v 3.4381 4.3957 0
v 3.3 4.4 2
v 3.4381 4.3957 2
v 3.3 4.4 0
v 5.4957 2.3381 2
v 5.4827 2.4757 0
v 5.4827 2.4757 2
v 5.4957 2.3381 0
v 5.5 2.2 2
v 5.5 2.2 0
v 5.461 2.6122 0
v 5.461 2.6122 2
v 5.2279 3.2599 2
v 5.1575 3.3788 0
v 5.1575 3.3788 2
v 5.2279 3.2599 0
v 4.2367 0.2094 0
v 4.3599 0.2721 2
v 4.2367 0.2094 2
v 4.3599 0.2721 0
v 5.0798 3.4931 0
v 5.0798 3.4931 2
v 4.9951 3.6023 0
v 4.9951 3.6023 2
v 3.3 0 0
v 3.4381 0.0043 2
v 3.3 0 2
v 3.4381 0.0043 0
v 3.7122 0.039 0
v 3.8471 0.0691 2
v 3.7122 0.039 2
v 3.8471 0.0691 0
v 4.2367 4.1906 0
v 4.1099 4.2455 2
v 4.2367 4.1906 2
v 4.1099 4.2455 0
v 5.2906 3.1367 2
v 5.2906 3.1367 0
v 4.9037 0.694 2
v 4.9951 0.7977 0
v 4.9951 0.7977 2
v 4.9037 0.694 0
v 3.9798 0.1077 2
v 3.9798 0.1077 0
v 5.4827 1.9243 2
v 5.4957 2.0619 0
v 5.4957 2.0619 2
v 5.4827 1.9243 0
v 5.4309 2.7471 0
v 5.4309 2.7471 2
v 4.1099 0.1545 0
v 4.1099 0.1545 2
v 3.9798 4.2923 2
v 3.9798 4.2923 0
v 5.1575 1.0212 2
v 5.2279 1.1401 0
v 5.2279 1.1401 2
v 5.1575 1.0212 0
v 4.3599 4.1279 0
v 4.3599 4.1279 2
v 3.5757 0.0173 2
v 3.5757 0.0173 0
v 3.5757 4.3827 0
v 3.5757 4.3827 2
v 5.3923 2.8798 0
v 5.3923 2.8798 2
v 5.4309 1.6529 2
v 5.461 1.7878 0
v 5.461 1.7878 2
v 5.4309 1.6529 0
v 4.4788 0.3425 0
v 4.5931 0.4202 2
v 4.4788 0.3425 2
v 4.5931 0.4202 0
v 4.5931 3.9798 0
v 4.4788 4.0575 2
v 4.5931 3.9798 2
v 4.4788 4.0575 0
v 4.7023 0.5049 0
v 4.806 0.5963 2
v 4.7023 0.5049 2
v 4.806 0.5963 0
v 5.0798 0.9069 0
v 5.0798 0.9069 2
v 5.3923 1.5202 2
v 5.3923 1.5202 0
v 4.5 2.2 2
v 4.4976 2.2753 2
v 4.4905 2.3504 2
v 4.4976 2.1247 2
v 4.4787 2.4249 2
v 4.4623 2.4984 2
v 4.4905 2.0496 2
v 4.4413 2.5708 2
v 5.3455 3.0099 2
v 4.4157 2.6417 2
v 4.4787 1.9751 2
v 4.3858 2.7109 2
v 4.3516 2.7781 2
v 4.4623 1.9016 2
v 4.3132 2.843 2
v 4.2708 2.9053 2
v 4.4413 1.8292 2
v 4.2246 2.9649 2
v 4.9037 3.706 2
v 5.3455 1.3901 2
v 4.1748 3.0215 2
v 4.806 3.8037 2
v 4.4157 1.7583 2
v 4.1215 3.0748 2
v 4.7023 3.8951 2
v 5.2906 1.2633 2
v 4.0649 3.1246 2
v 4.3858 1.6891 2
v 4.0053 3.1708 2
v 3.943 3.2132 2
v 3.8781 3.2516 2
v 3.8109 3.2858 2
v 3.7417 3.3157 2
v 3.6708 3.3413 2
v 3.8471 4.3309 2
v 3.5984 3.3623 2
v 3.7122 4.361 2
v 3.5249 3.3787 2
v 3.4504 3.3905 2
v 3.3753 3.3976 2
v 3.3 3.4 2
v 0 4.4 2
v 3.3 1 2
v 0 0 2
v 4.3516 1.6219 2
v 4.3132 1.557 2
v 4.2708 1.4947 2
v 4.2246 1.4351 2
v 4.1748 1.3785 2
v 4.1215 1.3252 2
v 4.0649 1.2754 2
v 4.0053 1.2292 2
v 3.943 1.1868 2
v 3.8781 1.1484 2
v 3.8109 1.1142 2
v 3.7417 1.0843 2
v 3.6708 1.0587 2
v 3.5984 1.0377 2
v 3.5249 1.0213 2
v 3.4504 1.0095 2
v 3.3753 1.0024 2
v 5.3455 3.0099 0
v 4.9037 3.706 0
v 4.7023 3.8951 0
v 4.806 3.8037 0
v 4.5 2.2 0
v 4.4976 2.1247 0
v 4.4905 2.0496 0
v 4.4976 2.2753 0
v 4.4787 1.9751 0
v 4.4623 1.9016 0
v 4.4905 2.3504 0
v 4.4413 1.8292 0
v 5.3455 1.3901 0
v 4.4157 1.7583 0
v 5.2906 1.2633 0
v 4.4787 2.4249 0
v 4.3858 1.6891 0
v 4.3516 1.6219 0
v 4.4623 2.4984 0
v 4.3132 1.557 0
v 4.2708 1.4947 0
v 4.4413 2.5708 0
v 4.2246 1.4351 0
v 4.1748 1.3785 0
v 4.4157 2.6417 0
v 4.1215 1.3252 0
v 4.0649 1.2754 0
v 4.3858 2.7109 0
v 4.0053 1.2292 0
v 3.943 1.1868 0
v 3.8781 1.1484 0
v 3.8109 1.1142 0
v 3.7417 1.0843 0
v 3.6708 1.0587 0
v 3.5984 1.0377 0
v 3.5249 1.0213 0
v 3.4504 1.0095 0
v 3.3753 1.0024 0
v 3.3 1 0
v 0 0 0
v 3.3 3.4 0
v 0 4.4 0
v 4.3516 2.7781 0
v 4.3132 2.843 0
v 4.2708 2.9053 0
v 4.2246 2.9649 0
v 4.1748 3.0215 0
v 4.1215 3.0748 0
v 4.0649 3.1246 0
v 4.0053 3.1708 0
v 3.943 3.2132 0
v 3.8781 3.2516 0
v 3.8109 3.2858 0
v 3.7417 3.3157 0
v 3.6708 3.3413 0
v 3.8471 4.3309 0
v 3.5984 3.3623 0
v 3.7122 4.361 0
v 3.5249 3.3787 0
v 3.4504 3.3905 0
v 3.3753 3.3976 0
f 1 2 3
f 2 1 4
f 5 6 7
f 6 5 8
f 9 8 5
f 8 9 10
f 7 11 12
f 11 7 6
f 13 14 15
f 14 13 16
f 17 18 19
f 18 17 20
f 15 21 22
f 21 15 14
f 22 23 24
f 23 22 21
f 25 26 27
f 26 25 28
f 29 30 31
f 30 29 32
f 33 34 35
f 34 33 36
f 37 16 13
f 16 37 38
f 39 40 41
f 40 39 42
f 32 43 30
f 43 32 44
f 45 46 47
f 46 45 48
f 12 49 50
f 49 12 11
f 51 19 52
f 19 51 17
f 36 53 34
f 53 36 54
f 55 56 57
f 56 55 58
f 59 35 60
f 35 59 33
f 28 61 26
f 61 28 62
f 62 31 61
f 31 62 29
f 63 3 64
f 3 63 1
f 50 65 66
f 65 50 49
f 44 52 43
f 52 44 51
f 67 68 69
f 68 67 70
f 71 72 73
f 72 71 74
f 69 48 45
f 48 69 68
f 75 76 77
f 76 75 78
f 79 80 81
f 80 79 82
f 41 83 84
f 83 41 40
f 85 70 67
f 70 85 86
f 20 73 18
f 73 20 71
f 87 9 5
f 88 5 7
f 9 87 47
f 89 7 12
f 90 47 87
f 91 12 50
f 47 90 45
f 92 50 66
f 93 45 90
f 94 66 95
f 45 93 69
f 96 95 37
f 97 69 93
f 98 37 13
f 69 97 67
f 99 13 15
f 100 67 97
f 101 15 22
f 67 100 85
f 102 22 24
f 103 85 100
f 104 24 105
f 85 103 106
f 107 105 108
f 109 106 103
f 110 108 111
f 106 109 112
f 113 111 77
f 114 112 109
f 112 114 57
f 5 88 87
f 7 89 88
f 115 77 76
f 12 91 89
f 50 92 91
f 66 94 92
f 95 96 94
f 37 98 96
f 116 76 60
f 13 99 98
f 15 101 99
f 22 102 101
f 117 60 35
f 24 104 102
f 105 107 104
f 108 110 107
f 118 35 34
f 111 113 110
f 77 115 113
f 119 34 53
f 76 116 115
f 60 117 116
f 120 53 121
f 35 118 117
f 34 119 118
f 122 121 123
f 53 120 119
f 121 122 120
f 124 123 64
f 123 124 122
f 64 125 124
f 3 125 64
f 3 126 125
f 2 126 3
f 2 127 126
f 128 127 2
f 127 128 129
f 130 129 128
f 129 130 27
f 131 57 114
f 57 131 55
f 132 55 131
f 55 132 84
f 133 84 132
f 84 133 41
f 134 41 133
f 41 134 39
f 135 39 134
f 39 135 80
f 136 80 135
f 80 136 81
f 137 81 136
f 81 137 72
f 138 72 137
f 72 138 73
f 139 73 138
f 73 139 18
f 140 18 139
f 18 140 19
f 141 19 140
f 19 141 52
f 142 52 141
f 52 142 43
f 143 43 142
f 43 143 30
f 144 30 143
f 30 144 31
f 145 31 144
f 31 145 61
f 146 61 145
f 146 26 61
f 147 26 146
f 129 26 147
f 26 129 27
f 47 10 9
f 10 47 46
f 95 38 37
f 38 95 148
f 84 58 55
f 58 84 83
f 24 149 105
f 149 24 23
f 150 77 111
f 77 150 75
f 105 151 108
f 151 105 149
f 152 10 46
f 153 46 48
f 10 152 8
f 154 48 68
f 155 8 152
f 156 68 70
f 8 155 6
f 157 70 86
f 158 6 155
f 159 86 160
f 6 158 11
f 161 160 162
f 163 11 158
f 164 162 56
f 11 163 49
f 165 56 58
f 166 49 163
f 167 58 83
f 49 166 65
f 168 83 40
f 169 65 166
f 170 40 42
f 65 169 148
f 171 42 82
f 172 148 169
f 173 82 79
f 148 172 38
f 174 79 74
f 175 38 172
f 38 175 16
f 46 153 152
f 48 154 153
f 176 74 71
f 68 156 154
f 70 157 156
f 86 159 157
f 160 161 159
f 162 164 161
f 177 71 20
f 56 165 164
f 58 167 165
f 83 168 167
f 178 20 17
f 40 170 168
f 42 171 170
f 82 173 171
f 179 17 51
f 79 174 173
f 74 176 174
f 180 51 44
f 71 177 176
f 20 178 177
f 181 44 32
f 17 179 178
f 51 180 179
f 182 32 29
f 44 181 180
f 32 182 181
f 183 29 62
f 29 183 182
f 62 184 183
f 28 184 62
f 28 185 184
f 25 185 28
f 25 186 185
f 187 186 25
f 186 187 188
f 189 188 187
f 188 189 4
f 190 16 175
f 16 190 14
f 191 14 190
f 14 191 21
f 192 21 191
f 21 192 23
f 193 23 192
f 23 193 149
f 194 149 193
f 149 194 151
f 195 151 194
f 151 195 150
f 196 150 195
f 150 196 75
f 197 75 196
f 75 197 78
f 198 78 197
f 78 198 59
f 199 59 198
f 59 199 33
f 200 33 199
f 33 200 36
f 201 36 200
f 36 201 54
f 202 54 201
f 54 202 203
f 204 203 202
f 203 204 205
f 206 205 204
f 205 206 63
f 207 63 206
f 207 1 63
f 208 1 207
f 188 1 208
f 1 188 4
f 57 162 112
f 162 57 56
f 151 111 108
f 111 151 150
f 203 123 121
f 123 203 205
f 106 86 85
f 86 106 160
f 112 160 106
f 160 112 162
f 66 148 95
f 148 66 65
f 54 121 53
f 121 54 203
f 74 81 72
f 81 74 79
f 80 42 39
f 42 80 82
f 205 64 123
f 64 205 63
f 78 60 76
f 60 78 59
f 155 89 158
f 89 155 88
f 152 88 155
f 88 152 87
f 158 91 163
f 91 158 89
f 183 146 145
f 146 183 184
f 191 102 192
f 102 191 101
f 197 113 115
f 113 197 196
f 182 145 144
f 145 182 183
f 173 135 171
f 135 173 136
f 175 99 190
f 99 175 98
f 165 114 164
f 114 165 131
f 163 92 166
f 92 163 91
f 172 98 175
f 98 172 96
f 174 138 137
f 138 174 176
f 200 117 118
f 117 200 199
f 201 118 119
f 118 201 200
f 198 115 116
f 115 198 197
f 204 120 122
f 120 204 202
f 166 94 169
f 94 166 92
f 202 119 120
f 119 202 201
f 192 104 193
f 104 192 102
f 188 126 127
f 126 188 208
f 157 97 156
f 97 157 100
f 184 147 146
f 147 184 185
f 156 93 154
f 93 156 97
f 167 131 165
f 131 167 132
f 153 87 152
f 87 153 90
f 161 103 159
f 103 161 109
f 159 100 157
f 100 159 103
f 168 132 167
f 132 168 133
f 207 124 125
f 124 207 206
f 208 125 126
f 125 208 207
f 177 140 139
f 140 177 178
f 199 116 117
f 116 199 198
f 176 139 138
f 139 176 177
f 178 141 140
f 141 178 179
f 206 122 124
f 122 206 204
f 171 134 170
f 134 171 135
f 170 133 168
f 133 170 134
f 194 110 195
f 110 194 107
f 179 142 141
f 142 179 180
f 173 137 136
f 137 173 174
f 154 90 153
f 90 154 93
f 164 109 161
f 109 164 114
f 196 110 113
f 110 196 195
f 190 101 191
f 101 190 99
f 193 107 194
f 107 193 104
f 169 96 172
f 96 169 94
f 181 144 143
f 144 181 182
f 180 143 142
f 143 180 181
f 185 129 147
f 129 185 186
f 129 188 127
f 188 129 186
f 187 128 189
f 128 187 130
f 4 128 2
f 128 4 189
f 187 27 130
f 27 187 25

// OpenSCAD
// Parámetros
r_i = 1.2;                          // radio interior del agujero principal
espesor_pared = 1.0;               // margen
r_e = r_i + espesor_pared;

altura = 2;
profundidad = r_e * 2;
ancho_cubo = r_e * 1.5;

radio_eje_horizontal = 0.4;             // radio del nuevo agujero horizontal
distancia_segura = 0.4;                 // separación entre el final del agujero horizontal y el agujero vertical

$fn = 100;

// Calculamos cuánto puede entrar el agujero horizontal sin tocar el vertical
profundidad_horizontal = (profundidad / 2) - r_e - distancia_segura;

difference() {
    union() {
        // Parte cilíndrica (hueca)
        difference() {
            translate([ancho_cubo, profundidad / 2, 0])
                cylinder(h = altura, r = r_e);
            translate([ancho_cubo, profundidad / 2, -1])
                cylinder(h = altura + 2, r = r_i);
        }

        // Parte cúbica
        cube([ancho_cubo, profundidad, altura]);
    }

    // Agujero horizontal exacto (como en la imagen)
    translate([ancho_cubo / 2, 0, altura / 2])
        rotate([0,90,0])
            cylinder(h = profundidad_horizontal, r = radio_eje_horizontal);
}
